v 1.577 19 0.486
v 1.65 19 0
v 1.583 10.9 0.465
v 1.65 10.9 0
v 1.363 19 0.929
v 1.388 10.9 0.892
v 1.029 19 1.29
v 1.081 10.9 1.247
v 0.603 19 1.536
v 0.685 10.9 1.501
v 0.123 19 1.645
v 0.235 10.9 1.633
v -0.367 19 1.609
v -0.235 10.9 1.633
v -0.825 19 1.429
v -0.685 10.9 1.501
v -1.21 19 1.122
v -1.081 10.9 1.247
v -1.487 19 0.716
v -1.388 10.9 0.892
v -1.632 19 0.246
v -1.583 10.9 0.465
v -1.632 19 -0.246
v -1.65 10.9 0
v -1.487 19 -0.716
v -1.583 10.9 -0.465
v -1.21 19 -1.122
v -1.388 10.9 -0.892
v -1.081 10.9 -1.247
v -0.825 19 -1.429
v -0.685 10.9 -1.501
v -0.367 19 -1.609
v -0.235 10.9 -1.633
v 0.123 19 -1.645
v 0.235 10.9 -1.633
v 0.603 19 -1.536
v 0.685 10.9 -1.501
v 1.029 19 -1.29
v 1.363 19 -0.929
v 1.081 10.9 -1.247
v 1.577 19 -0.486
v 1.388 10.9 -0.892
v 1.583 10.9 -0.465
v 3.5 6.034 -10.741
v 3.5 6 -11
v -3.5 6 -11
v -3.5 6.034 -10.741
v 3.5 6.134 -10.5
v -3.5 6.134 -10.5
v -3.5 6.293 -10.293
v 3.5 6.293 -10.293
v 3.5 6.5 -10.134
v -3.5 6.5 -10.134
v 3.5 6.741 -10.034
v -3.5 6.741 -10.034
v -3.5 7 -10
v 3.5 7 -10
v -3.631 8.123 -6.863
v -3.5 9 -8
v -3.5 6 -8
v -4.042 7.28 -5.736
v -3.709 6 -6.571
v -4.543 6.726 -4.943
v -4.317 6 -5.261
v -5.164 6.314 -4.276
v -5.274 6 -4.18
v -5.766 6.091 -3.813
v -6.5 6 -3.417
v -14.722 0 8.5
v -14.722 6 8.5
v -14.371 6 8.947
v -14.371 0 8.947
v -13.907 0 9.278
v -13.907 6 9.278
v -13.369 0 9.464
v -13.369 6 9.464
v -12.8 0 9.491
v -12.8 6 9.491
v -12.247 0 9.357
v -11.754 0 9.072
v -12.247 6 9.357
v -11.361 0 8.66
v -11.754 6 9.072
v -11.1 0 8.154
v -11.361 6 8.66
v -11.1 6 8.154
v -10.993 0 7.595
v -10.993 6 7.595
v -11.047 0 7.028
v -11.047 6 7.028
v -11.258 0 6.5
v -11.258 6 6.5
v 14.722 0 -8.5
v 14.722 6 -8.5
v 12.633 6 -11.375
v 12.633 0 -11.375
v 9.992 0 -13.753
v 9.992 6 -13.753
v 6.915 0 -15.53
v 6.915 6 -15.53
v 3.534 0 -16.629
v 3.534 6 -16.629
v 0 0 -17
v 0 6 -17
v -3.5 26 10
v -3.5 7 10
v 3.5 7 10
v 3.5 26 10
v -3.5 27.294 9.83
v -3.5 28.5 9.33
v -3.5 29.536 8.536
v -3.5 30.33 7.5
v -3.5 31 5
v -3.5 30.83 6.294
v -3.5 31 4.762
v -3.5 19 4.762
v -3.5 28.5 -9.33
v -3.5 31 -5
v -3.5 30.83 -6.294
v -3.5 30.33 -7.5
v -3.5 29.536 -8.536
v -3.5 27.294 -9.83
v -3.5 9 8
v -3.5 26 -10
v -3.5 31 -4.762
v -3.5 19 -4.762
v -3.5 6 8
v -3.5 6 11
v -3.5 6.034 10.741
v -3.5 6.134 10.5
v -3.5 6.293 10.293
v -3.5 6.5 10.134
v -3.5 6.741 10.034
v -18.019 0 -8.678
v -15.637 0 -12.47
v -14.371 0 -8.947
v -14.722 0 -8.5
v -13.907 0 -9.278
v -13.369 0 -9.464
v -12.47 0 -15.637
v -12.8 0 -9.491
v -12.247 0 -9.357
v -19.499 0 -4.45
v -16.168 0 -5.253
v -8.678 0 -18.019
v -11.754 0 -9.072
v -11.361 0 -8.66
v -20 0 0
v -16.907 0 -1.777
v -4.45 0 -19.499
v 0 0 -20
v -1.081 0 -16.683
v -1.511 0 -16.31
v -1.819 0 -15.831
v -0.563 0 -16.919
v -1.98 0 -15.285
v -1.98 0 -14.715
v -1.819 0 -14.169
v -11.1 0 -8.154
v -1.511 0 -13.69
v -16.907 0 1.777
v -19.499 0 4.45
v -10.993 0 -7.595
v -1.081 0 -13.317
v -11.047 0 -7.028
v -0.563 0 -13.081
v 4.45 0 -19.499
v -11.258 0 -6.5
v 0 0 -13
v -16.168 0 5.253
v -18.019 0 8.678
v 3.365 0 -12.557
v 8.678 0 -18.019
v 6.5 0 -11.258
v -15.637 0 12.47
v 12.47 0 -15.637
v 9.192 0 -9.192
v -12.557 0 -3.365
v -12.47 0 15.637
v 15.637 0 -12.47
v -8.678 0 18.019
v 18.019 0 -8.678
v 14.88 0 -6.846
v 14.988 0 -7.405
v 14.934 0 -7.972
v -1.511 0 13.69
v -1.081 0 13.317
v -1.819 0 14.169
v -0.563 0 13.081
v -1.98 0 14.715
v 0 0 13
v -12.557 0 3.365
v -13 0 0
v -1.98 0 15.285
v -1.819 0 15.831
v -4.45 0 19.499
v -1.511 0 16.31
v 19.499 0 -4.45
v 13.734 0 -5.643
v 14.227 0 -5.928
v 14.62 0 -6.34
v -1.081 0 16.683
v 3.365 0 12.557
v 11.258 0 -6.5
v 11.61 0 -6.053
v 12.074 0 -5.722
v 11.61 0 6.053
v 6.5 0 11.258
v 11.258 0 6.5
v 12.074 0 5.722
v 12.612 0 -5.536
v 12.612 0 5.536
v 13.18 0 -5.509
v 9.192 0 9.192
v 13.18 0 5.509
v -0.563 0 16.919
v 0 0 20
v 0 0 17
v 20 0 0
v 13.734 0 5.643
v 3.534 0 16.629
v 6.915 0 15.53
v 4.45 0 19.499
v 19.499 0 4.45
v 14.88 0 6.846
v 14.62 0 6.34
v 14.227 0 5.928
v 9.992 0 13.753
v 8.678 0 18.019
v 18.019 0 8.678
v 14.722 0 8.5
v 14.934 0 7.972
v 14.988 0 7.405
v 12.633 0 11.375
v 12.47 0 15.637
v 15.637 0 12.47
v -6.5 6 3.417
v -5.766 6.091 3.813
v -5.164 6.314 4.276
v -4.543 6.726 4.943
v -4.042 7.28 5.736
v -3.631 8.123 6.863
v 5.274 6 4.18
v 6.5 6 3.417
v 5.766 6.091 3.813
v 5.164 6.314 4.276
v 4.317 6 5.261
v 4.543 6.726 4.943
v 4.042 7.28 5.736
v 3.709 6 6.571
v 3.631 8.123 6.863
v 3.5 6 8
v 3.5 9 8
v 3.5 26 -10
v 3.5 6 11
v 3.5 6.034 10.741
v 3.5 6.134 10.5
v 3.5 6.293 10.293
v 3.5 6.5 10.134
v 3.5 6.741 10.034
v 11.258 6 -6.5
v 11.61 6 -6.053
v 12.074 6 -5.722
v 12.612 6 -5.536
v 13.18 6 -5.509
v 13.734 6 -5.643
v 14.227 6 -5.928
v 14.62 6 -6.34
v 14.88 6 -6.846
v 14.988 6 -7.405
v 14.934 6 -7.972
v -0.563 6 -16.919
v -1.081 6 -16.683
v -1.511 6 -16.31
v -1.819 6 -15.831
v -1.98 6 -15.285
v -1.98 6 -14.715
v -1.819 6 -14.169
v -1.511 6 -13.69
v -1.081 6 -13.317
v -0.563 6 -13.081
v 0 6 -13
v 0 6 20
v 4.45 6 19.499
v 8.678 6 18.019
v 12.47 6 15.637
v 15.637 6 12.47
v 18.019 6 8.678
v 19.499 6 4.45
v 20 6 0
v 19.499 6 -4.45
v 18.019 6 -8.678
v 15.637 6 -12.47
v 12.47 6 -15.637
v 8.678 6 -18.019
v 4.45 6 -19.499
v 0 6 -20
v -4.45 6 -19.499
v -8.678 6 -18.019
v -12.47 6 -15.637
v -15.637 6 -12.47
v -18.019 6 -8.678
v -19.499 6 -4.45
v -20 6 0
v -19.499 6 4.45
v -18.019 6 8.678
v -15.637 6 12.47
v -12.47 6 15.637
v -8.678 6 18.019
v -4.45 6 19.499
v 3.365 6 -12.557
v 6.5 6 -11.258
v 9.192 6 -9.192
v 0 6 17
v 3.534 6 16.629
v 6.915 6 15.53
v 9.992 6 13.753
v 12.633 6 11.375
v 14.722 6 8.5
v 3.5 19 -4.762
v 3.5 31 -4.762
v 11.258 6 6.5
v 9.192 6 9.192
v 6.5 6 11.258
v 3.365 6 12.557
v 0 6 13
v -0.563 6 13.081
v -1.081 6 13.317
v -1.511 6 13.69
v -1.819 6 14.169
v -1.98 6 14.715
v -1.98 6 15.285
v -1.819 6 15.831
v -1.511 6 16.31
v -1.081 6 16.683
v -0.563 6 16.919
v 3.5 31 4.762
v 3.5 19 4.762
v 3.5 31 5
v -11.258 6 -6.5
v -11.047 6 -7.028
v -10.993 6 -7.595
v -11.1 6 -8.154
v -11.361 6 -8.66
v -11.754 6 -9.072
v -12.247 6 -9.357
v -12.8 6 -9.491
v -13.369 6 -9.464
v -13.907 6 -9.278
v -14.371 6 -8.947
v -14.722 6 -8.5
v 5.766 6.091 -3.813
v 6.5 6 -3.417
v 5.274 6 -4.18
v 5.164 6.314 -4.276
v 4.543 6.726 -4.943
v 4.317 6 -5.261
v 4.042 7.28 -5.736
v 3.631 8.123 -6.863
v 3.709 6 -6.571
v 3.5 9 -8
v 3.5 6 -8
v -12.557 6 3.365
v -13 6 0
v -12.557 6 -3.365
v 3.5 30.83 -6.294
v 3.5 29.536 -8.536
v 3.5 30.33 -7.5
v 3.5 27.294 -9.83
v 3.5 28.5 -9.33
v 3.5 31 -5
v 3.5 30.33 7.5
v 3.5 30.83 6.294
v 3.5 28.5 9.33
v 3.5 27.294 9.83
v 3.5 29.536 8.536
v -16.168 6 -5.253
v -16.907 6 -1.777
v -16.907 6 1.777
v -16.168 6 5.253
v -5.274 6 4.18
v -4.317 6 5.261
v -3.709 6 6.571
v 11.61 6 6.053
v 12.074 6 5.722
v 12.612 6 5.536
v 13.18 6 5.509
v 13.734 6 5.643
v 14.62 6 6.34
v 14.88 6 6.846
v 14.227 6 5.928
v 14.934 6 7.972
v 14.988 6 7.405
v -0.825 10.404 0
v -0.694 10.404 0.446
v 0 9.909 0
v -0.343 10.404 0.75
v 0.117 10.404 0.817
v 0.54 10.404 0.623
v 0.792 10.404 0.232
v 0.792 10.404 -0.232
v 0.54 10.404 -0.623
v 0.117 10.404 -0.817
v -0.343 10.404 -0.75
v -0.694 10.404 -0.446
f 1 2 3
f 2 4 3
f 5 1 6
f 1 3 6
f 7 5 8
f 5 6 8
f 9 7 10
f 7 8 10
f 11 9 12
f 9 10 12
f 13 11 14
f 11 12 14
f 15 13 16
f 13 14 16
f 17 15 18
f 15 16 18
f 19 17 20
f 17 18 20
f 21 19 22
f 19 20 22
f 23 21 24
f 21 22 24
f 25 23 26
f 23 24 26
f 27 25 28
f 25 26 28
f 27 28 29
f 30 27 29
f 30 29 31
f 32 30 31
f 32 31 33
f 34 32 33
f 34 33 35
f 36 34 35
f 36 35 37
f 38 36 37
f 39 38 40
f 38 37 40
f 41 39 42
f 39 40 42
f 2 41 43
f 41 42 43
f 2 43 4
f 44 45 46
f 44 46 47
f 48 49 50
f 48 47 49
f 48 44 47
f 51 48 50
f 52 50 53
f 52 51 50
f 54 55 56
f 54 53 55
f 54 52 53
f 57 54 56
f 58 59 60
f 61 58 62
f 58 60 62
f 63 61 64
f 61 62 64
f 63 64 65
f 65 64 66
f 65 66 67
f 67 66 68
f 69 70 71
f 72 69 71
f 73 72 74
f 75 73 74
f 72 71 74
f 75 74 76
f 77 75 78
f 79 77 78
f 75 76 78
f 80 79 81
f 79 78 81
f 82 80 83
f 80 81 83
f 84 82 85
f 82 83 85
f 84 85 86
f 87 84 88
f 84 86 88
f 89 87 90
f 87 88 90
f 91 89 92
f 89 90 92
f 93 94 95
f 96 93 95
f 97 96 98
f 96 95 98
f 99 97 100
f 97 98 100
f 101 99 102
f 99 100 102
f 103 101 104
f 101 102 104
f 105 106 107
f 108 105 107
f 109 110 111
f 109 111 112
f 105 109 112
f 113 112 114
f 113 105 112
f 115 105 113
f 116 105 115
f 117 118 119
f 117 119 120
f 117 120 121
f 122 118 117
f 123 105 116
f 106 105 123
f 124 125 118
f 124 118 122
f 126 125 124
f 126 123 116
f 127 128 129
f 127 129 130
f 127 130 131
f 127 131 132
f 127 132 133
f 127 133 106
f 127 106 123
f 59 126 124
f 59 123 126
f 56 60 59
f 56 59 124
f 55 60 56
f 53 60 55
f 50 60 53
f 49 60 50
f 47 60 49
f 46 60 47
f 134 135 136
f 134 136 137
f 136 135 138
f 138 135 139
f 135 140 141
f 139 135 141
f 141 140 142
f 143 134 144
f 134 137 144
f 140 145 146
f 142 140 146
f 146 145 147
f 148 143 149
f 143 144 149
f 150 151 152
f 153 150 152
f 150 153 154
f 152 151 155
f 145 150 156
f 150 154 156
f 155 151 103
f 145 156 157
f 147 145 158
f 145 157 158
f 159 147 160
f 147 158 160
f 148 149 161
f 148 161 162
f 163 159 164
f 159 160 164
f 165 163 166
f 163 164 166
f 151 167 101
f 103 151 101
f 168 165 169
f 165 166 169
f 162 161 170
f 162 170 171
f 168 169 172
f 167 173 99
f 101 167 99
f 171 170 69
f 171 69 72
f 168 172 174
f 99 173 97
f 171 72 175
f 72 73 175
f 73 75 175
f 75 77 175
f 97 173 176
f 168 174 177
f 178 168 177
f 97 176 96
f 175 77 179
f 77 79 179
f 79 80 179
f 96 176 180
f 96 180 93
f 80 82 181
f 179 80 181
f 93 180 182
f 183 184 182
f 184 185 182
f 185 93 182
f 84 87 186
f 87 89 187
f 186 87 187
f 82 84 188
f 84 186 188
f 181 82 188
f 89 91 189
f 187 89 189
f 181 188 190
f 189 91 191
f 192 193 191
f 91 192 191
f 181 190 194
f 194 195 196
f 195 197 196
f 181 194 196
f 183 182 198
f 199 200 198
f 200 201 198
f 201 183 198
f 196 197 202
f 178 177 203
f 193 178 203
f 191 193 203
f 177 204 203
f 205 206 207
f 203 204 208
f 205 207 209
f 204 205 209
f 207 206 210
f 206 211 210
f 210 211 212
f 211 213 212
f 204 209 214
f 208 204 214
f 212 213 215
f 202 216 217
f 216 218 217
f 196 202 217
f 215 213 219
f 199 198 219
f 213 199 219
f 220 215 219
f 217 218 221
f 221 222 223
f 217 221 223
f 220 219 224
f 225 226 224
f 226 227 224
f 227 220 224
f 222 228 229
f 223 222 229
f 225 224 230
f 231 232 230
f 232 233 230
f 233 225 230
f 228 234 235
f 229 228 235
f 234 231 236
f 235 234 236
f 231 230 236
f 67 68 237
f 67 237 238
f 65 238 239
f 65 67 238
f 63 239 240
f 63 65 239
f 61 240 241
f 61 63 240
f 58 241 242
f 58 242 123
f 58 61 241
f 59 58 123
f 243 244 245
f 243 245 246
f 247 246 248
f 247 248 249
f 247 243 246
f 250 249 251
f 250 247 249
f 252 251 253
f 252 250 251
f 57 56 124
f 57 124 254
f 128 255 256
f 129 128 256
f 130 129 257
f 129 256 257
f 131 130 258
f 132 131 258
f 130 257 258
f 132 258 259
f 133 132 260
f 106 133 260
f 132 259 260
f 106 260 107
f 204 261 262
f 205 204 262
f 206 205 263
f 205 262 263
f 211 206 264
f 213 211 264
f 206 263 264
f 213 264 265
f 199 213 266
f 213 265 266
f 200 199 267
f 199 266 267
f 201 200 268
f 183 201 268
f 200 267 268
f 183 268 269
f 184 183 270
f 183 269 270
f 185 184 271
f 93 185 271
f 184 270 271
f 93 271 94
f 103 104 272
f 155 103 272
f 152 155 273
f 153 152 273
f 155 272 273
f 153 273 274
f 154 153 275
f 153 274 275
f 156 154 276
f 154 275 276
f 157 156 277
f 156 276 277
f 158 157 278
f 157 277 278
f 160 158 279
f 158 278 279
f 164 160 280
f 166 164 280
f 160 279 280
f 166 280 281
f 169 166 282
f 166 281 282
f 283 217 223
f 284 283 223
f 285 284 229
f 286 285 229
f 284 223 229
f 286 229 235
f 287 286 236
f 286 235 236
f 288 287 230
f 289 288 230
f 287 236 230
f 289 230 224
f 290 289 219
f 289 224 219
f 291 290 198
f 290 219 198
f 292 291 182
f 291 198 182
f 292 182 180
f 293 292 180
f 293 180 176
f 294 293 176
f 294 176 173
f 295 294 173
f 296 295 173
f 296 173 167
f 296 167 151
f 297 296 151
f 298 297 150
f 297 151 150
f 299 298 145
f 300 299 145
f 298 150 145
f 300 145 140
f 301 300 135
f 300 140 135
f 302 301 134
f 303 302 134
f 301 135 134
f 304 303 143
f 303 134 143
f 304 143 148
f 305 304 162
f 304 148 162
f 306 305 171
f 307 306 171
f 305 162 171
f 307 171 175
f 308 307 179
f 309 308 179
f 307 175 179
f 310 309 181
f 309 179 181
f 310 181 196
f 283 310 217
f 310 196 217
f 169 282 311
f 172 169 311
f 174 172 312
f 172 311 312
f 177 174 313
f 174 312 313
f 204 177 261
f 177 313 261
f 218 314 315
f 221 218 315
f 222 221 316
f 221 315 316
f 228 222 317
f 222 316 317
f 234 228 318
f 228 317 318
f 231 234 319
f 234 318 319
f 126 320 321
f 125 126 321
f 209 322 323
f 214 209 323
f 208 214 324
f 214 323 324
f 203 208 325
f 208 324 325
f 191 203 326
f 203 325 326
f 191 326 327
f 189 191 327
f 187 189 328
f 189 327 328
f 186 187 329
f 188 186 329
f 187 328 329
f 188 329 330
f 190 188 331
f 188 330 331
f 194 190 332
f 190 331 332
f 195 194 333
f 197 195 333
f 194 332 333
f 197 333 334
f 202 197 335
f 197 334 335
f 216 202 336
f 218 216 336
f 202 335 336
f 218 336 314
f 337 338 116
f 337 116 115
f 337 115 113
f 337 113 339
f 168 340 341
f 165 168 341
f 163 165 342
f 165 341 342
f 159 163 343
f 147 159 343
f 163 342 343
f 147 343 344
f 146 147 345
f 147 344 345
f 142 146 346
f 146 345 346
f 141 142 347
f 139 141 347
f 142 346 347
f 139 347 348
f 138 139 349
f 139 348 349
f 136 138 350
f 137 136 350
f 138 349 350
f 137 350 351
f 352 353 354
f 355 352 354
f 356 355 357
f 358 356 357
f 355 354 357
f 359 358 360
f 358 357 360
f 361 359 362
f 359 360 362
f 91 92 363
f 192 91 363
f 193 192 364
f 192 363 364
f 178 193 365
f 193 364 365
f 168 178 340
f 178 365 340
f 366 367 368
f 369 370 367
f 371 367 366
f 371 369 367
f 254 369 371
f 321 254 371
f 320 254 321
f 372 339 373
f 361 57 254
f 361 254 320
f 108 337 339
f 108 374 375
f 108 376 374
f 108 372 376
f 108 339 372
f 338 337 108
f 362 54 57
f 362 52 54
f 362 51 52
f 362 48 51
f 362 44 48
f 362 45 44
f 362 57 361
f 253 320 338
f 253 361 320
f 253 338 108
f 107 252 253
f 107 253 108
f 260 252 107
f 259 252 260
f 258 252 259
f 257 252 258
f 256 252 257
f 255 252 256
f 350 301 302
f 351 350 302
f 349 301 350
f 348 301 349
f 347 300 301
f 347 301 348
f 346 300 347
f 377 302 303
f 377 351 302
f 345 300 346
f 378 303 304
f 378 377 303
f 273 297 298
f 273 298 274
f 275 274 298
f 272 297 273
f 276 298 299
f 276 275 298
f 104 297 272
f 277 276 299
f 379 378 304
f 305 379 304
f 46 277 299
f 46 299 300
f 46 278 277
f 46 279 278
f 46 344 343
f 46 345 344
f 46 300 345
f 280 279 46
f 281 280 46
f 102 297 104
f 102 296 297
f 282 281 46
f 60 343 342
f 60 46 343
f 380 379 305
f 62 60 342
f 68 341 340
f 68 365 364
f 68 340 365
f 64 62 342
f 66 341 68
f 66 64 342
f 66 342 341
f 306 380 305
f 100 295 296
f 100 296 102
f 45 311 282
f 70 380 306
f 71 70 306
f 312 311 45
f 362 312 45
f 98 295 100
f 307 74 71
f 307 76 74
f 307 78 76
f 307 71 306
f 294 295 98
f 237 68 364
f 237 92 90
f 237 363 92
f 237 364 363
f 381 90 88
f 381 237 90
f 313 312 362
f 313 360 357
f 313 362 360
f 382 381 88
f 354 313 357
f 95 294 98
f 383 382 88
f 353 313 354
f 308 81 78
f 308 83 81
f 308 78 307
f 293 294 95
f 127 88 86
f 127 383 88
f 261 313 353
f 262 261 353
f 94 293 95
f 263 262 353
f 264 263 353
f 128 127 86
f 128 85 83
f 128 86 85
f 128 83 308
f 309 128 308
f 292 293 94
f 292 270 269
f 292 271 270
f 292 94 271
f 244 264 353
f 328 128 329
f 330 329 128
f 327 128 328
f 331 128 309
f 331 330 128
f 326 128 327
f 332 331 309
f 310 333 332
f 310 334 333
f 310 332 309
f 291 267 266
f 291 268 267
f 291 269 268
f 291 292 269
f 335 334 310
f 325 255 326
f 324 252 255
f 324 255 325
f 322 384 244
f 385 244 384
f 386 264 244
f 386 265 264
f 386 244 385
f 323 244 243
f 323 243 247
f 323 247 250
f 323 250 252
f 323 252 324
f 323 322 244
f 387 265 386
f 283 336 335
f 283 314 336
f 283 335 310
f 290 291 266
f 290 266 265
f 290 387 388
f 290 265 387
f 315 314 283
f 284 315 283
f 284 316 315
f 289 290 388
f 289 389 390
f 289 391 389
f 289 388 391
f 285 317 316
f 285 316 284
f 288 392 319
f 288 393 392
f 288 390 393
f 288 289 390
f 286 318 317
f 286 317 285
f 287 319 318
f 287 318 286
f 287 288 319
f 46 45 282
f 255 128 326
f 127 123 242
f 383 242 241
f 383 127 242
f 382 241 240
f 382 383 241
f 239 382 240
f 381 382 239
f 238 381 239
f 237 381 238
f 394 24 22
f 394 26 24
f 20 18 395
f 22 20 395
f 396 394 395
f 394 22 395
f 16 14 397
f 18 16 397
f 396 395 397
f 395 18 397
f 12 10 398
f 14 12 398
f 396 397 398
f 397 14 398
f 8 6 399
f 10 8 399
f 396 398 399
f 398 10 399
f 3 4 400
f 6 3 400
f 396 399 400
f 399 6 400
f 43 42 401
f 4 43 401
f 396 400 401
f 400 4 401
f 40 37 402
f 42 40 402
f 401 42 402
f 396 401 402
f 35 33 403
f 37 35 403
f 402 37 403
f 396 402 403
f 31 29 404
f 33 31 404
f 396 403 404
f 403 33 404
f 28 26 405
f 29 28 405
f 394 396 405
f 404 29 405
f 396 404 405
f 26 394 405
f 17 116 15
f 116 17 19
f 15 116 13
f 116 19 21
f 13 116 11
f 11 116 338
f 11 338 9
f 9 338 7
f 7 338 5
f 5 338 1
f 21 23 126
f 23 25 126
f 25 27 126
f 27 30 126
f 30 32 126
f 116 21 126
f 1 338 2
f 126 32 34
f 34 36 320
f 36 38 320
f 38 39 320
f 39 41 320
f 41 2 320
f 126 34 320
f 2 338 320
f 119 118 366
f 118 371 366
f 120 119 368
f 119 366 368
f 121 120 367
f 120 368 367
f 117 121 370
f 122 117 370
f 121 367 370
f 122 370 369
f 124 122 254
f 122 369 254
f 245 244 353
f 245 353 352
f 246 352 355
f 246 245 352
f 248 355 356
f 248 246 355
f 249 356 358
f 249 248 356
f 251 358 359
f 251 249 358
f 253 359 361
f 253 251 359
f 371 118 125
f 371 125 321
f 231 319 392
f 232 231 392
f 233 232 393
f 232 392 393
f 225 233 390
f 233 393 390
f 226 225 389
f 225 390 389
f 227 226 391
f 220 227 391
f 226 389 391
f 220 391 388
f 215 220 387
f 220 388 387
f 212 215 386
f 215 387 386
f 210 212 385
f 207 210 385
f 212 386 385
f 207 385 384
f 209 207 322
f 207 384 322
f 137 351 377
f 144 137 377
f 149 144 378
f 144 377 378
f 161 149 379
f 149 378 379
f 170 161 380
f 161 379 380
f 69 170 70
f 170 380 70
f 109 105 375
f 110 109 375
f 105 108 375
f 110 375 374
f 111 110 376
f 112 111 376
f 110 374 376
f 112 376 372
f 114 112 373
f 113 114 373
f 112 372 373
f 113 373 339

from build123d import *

# Parameters (mm, degrees)
SKETCH1_R                 = 20
BOSS_EXTRUDE1_DEPTH       = 6
CUT_EXTRUDE1_DEPTH        = 29.91366459
CIRPATTERN1_COUNT         = 3
SKETCH3_W                 = 7
SKETCH3_H                 = 20
BOSS_EXTRUDE2_DEPTH       = 25
SKETCH4_W                 = 9.525
SKETCH4_H                 = 12
CUT_EXTRUDE2_DEPTH        = 44.7407133
FILLET1_R                 = 1
FILLET2_R                 = 3
CUT_EXTRUDE3_DEPTH        = 38.749172176
M4X0_7_TAPPED_HOLE1_D     = 3.3
M4X0_7_TAPPED_HOLE1_DEPTH = 8.1
M4X0_7_TAPPED_HOLE1_TIP   = 0.991420021
FILLET3_R                 = 5


with BuildPart() as part:
    # Sketch1 → Boss-Extrude1 (new body)
    with BuildSketch(Plane(origin=(0, 0, 0), x_dir=(1, 0, 0), z_dir=(0, 1, 0))):
        Circle(SKETCH1_R)
    extrude(amount=BOSS_EXTRUDE1_DEPTH)

    # Sketch2 → Cut-Extrude1 (cut, through all)
    with BuildSketch(Plane(origin=(0, 6, 0), x_dir=(1, 0, 0), z_dir=(0, 1, 0))):
        with BuildLine():
            ThreePointArc((0, 17), (-2, 15), (0, 13))
            ThreePointArc((0, 13), (6.5, 11.258330249), (11.258330249, 6.5))
            ThreePointArc((11.258330249, 6.5), (13.990381057, 5.767949192), (14.722431864, 8.5))
            ThreePointArc((14.722431864, 8.5), (8.5, 14.722431864), (0, 17))
        make_face()
    cut_extrude1 = extrude(amount=-CUT_EXTRUDE1_DEPTH, mode=Mode.SUBTRACT)

    # CirPattern1: Cut-Extrude1 ×3 about axis
    cirpattern1_axis = Axis((0, 6, 0), (0, -1, 0))
    for i in range(1, CIRPATTERN1_COUNT):
        add(cut_extrude1.rotate(cirpattern1_axis, i * 360 / CIRPATTERN1_COUNT), mode=Mode.SUBTRACT)

    # Sketch3 → Boss-Extrude2 (add)
    with BuildSketch(Plane(origin=(0, 6, 0), x_dir=(1, 0, 0), z_dir=(0, 1, 0))):
        Rectangle(SKETCH3_W, SKETCH3_H)
    extrude(amount=BOSS_EXTRUDE2_DEPTH)

    # Sketch4 → Cut-Extrude2 (cut, through all)
    with BuildSketch(Plane(origin=(3.5, 0, 0), x_dir=(0, 0, -1), z_dir=(1, 0, 0))):
        with Locations((0, 25)):
            Rectangle(SKETCH4_W, SKETCH4_H)
    extrude(amount=-CUT_EXTRUDE2_DEPTH, mode=Mode.SUBTRACT)

    # Fillet1
    fillet1_edges = [part.edges().sort_by_distance(p)[0] for p in [
        (0, 6, -10),
        (0, 6, 10),
    ]]
    fillet(fillet1_edges, radius=FILLET1_R)

    # Fillet2
    fillet2_edges = [part.edges().sort_by_distance(p)[0] for p in [
        (3.5, 6, 0),
    ]]
    fillet(fillet2_edges, radius=FILLET2_R)
    fillet2_2_edges = [part.edges().sort_by_distance(p)[0] for p in [
        (-3.5, 6, 0),
    ]]
    fillet(fillet2_2_edges, radius=FILLET2_R)

    # Sketch5 → Cut-Extrude3 (cut, through all)
    with BuildSketch(Plane(origin=(0, 6, 0), x_dir=(1, 0, 0), z_dir=(0, 1, 0))):
        with BuildLine():
            Line((-9.5, 13), (-3.5, 13))
            Line((-3.5, 13), (-3.5, 8))
            ThreePointArc((-3.5, 8), (-4.964466094, 4.464466094), (-8.5, 3))
            Line((-8.5, 3), (-9.5, 3))
            Line((-9.5, 3), (-9.5, 13))
        make_face()
        with BuildLine():
            Line((9.5, 3), (8.5, 3))
            ThreePointArc((8.5, 3), (4.964466094, 4.464466094), (3.5, 8))
            Line((3.5, 8), (3.5, 13))
            Line((3.5, 13), (9.5, 13))
            Line((9.5, 13), (9.5, 3))
        make_face()
        with BuildLine():
            Line((9.5, -13), (9.5, -3))
            Line((9.5, -3), (8.5, -3))
            ThreePointArc((8.5, -3), (4.964466094, -4.464466094), (3.5, -8))
            Line((3.5, -8), (3.5, -13))
            Line((3.5, -13), (9.5, -13))
        make_face()
        with BuildLine():
            Line((-3.5, -13), (-3.5, -8))
            ThreePointArc((-3.5, -8), (-4.964466094, -4.464466094), (-8.5, -3))
            Line((-8.5, -3), (-9.5, -3))
            Line((-9.5, -3), (-9.5, -13))
            Line((-9.5, -13), (-3.5, -13))
        make_face()
    extrude(amount=CUT_EXTRUDE3_DEPTH, mode=Mode.SUBTRACT)

    # M4x0.7 Tapped Hole1
    with Locations(Plane(origin=(0, 19, 0), x_dir=(-1, 0, 0), z_dir=(0, 1, 0))):
        with Locations((0, 0)):
            Hole(M4X0_7_TAPPED_HOLE1_D / 2, depth=M4X0_7_TAPPED_HOLE1_DEPTH)
            with Locations((0, 0, -(M4X0_7_TAPPED_HOLE1_DEPTH + M4X0_7_TAPPED_HOLE1_TIP / 2))):  # 118° drill point
                Cone(0, M4X0_7_TAPPED_HOLE1_D / 2, M4X0_7_TAPPED_HOLE1_TIP, mode=Mode.SUBTRACT)

    # Fillet3
    fillet3_edges = [part.edges().sort_by_distance(p)[0] for p in [
        (0, 31, -10),
        (0, 31, 10),
    ]]
    fillet(fillet3_edges, radius=FILLET3_R)


solid = part.part
